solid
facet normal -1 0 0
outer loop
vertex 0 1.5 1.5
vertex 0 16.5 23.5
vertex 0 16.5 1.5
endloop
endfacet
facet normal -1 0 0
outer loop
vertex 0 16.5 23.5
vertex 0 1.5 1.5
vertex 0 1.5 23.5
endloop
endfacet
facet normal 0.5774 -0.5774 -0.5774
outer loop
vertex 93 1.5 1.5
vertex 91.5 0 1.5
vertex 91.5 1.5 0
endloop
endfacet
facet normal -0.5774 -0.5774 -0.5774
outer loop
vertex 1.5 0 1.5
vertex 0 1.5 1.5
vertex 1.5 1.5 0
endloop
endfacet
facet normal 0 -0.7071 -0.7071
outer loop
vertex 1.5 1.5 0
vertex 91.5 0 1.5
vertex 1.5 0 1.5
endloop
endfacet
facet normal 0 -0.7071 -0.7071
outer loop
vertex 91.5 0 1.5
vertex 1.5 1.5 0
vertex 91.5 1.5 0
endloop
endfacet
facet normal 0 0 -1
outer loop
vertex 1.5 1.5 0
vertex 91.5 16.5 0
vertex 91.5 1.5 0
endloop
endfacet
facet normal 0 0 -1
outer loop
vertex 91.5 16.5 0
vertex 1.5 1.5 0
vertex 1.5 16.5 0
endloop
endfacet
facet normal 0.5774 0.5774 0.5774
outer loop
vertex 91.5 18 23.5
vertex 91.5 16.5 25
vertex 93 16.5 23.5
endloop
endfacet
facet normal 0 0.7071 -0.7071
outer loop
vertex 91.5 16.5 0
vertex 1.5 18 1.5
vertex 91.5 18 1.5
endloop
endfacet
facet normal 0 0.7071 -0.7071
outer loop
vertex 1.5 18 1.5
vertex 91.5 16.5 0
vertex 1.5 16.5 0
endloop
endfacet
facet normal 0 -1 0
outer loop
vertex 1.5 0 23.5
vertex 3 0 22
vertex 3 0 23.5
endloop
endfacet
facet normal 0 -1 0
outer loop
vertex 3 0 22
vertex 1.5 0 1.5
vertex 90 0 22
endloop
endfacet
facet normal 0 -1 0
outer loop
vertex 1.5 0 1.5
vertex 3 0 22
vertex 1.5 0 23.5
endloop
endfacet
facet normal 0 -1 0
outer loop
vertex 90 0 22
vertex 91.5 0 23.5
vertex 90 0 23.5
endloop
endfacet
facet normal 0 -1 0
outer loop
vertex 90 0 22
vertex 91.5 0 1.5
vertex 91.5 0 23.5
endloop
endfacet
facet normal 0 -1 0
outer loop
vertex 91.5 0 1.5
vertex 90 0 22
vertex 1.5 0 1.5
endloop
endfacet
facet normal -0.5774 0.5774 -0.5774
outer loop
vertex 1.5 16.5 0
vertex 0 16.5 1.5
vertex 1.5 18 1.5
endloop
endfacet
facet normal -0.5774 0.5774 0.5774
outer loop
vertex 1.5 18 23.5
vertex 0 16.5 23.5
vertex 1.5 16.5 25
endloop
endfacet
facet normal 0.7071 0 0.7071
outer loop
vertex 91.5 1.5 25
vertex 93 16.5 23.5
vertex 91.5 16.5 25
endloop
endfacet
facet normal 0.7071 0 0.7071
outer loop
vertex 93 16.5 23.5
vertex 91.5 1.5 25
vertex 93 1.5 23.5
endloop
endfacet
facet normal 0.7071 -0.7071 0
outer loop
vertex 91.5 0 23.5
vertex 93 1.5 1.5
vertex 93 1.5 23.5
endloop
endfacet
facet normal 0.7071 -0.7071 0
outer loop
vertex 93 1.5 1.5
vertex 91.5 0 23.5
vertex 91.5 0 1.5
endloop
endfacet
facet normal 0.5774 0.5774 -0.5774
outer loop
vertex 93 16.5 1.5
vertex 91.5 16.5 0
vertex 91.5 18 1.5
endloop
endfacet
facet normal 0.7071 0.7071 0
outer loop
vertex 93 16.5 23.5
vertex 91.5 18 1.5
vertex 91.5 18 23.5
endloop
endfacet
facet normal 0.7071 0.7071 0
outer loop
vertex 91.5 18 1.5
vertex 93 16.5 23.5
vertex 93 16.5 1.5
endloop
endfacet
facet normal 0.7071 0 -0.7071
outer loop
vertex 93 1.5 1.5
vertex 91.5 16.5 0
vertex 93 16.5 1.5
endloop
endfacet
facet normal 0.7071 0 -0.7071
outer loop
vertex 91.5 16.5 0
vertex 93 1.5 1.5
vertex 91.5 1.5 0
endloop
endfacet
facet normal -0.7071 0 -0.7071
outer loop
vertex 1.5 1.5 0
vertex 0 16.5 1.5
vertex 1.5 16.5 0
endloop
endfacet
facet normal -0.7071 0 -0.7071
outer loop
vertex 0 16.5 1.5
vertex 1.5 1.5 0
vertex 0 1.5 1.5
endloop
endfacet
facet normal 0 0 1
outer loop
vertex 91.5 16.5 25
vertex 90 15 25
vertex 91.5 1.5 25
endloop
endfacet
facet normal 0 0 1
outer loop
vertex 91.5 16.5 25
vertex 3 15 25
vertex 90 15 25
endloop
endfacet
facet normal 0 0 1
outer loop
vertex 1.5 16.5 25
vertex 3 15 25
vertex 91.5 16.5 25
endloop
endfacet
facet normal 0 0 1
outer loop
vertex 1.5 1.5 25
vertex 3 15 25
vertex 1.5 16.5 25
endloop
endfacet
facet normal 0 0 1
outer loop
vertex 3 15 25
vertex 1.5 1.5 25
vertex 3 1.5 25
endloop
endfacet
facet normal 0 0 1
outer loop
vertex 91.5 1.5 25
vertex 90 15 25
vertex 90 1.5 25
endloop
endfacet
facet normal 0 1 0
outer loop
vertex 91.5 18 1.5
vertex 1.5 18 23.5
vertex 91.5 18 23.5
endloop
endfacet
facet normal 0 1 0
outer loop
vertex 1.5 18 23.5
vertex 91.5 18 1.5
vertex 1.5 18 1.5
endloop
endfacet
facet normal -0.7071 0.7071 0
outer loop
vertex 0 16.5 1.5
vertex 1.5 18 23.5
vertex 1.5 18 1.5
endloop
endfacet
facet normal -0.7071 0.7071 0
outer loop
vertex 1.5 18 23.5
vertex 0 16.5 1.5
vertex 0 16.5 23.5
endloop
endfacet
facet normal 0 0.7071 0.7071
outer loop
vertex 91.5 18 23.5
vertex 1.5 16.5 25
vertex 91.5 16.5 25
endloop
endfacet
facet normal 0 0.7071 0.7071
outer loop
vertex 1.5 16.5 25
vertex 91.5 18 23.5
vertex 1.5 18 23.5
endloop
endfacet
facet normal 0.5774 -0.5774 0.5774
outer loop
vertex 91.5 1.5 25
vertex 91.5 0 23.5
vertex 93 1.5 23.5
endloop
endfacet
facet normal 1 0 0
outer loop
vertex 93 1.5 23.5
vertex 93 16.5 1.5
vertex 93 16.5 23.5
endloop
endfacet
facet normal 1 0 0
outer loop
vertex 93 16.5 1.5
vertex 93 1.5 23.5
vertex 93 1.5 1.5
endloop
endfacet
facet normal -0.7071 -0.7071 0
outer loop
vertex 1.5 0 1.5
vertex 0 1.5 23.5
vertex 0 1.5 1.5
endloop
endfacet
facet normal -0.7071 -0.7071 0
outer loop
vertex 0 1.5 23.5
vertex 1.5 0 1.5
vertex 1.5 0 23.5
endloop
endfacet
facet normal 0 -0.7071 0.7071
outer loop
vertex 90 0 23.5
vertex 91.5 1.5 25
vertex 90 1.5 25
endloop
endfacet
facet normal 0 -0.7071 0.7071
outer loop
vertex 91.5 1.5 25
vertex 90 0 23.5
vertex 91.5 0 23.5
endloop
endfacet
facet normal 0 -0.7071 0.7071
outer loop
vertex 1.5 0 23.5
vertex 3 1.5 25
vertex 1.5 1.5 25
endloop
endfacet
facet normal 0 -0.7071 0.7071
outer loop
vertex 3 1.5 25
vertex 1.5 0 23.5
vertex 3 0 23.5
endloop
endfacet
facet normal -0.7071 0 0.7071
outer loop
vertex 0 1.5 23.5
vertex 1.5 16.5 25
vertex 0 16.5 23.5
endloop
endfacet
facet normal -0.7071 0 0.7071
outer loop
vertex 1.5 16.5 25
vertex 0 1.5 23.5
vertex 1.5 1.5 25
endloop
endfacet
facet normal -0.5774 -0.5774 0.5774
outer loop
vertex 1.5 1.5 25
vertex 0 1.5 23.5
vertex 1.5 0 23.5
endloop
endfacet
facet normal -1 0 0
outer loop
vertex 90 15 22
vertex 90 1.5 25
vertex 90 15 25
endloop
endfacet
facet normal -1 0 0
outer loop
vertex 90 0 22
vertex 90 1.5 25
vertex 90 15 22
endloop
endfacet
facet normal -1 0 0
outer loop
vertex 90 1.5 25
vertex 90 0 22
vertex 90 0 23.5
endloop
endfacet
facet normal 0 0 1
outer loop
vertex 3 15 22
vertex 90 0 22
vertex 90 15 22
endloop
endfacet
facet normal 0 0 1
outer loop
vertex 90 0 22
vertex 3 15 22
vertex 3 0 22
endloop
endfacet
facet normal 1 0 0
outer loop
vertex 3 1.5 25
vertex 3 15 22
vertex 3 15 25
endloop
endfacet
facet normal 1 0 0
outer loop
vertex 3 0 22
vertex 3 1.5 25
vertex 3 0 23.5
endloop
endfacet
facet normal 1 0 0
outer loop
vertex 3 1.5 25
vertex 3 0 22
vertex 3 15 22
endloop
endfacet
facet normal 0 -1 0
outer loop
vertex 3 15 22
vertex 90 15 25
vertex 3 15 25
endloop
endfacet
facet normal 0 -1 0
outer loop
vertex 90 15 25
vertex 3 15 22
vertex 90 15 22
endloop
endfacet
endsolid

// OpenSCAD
// Qi-charger riser for the Galaxy Fold 8.
//
// Standalone solid block that the phone rests on top of. It's not attached
// to PhoneHolder - it just sits on the table/charging pad and lifts
// the phone up by block_height so the phone's Qi coil lines up with the
// charger underneath. A thin lip traces 3 edges of the top face to keep
// the phone from sliding off; the 4th (long) side is left open/flush.
//
// Shape (top view of the lip, sitting on top of the solid block):
//
//   ┌───────────────────────────────────┐  <- closed lip (phone_width long)
//   │ lip                          lip  │     end lips (phone_depth long)
//   └───────────────────────────────────┘
//        ^ open long side - no lip here, flush with the block edge
//
// Built as a single chamfered outer block (outer_width x outer_depth x
// outer_height) with a notch subtracted from the top: everywhere except a
// `wall`-wide border strip on 3 sides gets cut down by `wall`, leaving that
// border standing proud as the lip. The notch is exactly the phone's
// footprint (phone_width x phone_depth), flush with the open edge.

// ============================================================
// PRINT PROFILE (see PRINTER.md for full slicer profile values)
// ------------------------------------------------------------
// Material:    PLA Basic — static desk furniture holding light phone weight
//               only; the 3mm lip is robust (unlike FastChargeRiser.scad's
//               fragile 0.5mm edge), so there's no toughness case for PETG
//               here. PLA prints cleaner and cheaper for a part like this.
// Nozzle:      0.4mm — no fine text/detail.
// Quality:     0.20mm Standard.
// Infill:      20% — solid block under light static load (a resting phone),
//               a small step above the 15% decorative default since it's a
//               daily-use object, not purely decorative.
// Orientation: print flat as modeled, base (outer_width x outer_depth
//               footprint) down — the only sane orientation for a block like
//               this.
// Overrides:   the bottom-edge chamfer (chamfer=1.5mm) shrinks the flat
//               bed-contact footprint slightly versus an unchamfered block —
//               if adhesion is marginal on the first layer, add a brim
//               rather than assuming the chamfered edge will stick fine.
// ============================================================

phone_width  = 87;    // phone footprint, X
phone_depth  = 15;    // phone footprint, Y
block_height = 22;    // how high the riser lifts the phone, Z
wall         = 3;   // lip thickness/height
chamfer      = 1.5;  // outer-edge chamfer (kept small - must be < wall/2 or the thin lip collapses)

outer_width  = phone_width + 2*wall;  // 88
outer_depth  = phone_depth + wall;    // 15.5 (lip only traces the closed long side)
outer_height = block_height + wall;   // 22.5

// octahedron used as the minkowski "brush" that chamfers every edge of a cube by 45 degrees
module octahedron(r) {
    polyhedron(
        points = [
            [ r, 0, 0], [-r, 0, 0],
            [ 0, r, 0], [ 0,-r, 0],
            [ 0, 0, r], [ 0, 0,-r]
        ],
        faces = [
            [0,2,4],[2,1,4],[1,3,4],[3,0,4],
            [0,3,5],[3,1,5],[1,2,5],[2,0,5]
        ]
    );
}

// drop-in replacement for cube(size) that chamfers all 12 edges by `c`
module chamfered_cube(size, c = chamfer) {
    minkowski() {
        translate([c, c, c])
        cube([size[0]-2*c, size[1]-2*c, size[2]-2*c]);
        octahedron(c);
    }
}

color("coral")
difference() {
    // single outer block, chamfered as one solid
    chamfered_cube([outer_width, outer_depth, outer_height]);

    // notch cut from the top, leaving the `wall`-wide border on 3 sides
    // standing proud as the lip; flush with the block edge on the open side
    translate([wall, 0, block_height])
        cube([phone_width, phone_depth, wall + 1]); // +1 so it clears the top face cleanly
}
